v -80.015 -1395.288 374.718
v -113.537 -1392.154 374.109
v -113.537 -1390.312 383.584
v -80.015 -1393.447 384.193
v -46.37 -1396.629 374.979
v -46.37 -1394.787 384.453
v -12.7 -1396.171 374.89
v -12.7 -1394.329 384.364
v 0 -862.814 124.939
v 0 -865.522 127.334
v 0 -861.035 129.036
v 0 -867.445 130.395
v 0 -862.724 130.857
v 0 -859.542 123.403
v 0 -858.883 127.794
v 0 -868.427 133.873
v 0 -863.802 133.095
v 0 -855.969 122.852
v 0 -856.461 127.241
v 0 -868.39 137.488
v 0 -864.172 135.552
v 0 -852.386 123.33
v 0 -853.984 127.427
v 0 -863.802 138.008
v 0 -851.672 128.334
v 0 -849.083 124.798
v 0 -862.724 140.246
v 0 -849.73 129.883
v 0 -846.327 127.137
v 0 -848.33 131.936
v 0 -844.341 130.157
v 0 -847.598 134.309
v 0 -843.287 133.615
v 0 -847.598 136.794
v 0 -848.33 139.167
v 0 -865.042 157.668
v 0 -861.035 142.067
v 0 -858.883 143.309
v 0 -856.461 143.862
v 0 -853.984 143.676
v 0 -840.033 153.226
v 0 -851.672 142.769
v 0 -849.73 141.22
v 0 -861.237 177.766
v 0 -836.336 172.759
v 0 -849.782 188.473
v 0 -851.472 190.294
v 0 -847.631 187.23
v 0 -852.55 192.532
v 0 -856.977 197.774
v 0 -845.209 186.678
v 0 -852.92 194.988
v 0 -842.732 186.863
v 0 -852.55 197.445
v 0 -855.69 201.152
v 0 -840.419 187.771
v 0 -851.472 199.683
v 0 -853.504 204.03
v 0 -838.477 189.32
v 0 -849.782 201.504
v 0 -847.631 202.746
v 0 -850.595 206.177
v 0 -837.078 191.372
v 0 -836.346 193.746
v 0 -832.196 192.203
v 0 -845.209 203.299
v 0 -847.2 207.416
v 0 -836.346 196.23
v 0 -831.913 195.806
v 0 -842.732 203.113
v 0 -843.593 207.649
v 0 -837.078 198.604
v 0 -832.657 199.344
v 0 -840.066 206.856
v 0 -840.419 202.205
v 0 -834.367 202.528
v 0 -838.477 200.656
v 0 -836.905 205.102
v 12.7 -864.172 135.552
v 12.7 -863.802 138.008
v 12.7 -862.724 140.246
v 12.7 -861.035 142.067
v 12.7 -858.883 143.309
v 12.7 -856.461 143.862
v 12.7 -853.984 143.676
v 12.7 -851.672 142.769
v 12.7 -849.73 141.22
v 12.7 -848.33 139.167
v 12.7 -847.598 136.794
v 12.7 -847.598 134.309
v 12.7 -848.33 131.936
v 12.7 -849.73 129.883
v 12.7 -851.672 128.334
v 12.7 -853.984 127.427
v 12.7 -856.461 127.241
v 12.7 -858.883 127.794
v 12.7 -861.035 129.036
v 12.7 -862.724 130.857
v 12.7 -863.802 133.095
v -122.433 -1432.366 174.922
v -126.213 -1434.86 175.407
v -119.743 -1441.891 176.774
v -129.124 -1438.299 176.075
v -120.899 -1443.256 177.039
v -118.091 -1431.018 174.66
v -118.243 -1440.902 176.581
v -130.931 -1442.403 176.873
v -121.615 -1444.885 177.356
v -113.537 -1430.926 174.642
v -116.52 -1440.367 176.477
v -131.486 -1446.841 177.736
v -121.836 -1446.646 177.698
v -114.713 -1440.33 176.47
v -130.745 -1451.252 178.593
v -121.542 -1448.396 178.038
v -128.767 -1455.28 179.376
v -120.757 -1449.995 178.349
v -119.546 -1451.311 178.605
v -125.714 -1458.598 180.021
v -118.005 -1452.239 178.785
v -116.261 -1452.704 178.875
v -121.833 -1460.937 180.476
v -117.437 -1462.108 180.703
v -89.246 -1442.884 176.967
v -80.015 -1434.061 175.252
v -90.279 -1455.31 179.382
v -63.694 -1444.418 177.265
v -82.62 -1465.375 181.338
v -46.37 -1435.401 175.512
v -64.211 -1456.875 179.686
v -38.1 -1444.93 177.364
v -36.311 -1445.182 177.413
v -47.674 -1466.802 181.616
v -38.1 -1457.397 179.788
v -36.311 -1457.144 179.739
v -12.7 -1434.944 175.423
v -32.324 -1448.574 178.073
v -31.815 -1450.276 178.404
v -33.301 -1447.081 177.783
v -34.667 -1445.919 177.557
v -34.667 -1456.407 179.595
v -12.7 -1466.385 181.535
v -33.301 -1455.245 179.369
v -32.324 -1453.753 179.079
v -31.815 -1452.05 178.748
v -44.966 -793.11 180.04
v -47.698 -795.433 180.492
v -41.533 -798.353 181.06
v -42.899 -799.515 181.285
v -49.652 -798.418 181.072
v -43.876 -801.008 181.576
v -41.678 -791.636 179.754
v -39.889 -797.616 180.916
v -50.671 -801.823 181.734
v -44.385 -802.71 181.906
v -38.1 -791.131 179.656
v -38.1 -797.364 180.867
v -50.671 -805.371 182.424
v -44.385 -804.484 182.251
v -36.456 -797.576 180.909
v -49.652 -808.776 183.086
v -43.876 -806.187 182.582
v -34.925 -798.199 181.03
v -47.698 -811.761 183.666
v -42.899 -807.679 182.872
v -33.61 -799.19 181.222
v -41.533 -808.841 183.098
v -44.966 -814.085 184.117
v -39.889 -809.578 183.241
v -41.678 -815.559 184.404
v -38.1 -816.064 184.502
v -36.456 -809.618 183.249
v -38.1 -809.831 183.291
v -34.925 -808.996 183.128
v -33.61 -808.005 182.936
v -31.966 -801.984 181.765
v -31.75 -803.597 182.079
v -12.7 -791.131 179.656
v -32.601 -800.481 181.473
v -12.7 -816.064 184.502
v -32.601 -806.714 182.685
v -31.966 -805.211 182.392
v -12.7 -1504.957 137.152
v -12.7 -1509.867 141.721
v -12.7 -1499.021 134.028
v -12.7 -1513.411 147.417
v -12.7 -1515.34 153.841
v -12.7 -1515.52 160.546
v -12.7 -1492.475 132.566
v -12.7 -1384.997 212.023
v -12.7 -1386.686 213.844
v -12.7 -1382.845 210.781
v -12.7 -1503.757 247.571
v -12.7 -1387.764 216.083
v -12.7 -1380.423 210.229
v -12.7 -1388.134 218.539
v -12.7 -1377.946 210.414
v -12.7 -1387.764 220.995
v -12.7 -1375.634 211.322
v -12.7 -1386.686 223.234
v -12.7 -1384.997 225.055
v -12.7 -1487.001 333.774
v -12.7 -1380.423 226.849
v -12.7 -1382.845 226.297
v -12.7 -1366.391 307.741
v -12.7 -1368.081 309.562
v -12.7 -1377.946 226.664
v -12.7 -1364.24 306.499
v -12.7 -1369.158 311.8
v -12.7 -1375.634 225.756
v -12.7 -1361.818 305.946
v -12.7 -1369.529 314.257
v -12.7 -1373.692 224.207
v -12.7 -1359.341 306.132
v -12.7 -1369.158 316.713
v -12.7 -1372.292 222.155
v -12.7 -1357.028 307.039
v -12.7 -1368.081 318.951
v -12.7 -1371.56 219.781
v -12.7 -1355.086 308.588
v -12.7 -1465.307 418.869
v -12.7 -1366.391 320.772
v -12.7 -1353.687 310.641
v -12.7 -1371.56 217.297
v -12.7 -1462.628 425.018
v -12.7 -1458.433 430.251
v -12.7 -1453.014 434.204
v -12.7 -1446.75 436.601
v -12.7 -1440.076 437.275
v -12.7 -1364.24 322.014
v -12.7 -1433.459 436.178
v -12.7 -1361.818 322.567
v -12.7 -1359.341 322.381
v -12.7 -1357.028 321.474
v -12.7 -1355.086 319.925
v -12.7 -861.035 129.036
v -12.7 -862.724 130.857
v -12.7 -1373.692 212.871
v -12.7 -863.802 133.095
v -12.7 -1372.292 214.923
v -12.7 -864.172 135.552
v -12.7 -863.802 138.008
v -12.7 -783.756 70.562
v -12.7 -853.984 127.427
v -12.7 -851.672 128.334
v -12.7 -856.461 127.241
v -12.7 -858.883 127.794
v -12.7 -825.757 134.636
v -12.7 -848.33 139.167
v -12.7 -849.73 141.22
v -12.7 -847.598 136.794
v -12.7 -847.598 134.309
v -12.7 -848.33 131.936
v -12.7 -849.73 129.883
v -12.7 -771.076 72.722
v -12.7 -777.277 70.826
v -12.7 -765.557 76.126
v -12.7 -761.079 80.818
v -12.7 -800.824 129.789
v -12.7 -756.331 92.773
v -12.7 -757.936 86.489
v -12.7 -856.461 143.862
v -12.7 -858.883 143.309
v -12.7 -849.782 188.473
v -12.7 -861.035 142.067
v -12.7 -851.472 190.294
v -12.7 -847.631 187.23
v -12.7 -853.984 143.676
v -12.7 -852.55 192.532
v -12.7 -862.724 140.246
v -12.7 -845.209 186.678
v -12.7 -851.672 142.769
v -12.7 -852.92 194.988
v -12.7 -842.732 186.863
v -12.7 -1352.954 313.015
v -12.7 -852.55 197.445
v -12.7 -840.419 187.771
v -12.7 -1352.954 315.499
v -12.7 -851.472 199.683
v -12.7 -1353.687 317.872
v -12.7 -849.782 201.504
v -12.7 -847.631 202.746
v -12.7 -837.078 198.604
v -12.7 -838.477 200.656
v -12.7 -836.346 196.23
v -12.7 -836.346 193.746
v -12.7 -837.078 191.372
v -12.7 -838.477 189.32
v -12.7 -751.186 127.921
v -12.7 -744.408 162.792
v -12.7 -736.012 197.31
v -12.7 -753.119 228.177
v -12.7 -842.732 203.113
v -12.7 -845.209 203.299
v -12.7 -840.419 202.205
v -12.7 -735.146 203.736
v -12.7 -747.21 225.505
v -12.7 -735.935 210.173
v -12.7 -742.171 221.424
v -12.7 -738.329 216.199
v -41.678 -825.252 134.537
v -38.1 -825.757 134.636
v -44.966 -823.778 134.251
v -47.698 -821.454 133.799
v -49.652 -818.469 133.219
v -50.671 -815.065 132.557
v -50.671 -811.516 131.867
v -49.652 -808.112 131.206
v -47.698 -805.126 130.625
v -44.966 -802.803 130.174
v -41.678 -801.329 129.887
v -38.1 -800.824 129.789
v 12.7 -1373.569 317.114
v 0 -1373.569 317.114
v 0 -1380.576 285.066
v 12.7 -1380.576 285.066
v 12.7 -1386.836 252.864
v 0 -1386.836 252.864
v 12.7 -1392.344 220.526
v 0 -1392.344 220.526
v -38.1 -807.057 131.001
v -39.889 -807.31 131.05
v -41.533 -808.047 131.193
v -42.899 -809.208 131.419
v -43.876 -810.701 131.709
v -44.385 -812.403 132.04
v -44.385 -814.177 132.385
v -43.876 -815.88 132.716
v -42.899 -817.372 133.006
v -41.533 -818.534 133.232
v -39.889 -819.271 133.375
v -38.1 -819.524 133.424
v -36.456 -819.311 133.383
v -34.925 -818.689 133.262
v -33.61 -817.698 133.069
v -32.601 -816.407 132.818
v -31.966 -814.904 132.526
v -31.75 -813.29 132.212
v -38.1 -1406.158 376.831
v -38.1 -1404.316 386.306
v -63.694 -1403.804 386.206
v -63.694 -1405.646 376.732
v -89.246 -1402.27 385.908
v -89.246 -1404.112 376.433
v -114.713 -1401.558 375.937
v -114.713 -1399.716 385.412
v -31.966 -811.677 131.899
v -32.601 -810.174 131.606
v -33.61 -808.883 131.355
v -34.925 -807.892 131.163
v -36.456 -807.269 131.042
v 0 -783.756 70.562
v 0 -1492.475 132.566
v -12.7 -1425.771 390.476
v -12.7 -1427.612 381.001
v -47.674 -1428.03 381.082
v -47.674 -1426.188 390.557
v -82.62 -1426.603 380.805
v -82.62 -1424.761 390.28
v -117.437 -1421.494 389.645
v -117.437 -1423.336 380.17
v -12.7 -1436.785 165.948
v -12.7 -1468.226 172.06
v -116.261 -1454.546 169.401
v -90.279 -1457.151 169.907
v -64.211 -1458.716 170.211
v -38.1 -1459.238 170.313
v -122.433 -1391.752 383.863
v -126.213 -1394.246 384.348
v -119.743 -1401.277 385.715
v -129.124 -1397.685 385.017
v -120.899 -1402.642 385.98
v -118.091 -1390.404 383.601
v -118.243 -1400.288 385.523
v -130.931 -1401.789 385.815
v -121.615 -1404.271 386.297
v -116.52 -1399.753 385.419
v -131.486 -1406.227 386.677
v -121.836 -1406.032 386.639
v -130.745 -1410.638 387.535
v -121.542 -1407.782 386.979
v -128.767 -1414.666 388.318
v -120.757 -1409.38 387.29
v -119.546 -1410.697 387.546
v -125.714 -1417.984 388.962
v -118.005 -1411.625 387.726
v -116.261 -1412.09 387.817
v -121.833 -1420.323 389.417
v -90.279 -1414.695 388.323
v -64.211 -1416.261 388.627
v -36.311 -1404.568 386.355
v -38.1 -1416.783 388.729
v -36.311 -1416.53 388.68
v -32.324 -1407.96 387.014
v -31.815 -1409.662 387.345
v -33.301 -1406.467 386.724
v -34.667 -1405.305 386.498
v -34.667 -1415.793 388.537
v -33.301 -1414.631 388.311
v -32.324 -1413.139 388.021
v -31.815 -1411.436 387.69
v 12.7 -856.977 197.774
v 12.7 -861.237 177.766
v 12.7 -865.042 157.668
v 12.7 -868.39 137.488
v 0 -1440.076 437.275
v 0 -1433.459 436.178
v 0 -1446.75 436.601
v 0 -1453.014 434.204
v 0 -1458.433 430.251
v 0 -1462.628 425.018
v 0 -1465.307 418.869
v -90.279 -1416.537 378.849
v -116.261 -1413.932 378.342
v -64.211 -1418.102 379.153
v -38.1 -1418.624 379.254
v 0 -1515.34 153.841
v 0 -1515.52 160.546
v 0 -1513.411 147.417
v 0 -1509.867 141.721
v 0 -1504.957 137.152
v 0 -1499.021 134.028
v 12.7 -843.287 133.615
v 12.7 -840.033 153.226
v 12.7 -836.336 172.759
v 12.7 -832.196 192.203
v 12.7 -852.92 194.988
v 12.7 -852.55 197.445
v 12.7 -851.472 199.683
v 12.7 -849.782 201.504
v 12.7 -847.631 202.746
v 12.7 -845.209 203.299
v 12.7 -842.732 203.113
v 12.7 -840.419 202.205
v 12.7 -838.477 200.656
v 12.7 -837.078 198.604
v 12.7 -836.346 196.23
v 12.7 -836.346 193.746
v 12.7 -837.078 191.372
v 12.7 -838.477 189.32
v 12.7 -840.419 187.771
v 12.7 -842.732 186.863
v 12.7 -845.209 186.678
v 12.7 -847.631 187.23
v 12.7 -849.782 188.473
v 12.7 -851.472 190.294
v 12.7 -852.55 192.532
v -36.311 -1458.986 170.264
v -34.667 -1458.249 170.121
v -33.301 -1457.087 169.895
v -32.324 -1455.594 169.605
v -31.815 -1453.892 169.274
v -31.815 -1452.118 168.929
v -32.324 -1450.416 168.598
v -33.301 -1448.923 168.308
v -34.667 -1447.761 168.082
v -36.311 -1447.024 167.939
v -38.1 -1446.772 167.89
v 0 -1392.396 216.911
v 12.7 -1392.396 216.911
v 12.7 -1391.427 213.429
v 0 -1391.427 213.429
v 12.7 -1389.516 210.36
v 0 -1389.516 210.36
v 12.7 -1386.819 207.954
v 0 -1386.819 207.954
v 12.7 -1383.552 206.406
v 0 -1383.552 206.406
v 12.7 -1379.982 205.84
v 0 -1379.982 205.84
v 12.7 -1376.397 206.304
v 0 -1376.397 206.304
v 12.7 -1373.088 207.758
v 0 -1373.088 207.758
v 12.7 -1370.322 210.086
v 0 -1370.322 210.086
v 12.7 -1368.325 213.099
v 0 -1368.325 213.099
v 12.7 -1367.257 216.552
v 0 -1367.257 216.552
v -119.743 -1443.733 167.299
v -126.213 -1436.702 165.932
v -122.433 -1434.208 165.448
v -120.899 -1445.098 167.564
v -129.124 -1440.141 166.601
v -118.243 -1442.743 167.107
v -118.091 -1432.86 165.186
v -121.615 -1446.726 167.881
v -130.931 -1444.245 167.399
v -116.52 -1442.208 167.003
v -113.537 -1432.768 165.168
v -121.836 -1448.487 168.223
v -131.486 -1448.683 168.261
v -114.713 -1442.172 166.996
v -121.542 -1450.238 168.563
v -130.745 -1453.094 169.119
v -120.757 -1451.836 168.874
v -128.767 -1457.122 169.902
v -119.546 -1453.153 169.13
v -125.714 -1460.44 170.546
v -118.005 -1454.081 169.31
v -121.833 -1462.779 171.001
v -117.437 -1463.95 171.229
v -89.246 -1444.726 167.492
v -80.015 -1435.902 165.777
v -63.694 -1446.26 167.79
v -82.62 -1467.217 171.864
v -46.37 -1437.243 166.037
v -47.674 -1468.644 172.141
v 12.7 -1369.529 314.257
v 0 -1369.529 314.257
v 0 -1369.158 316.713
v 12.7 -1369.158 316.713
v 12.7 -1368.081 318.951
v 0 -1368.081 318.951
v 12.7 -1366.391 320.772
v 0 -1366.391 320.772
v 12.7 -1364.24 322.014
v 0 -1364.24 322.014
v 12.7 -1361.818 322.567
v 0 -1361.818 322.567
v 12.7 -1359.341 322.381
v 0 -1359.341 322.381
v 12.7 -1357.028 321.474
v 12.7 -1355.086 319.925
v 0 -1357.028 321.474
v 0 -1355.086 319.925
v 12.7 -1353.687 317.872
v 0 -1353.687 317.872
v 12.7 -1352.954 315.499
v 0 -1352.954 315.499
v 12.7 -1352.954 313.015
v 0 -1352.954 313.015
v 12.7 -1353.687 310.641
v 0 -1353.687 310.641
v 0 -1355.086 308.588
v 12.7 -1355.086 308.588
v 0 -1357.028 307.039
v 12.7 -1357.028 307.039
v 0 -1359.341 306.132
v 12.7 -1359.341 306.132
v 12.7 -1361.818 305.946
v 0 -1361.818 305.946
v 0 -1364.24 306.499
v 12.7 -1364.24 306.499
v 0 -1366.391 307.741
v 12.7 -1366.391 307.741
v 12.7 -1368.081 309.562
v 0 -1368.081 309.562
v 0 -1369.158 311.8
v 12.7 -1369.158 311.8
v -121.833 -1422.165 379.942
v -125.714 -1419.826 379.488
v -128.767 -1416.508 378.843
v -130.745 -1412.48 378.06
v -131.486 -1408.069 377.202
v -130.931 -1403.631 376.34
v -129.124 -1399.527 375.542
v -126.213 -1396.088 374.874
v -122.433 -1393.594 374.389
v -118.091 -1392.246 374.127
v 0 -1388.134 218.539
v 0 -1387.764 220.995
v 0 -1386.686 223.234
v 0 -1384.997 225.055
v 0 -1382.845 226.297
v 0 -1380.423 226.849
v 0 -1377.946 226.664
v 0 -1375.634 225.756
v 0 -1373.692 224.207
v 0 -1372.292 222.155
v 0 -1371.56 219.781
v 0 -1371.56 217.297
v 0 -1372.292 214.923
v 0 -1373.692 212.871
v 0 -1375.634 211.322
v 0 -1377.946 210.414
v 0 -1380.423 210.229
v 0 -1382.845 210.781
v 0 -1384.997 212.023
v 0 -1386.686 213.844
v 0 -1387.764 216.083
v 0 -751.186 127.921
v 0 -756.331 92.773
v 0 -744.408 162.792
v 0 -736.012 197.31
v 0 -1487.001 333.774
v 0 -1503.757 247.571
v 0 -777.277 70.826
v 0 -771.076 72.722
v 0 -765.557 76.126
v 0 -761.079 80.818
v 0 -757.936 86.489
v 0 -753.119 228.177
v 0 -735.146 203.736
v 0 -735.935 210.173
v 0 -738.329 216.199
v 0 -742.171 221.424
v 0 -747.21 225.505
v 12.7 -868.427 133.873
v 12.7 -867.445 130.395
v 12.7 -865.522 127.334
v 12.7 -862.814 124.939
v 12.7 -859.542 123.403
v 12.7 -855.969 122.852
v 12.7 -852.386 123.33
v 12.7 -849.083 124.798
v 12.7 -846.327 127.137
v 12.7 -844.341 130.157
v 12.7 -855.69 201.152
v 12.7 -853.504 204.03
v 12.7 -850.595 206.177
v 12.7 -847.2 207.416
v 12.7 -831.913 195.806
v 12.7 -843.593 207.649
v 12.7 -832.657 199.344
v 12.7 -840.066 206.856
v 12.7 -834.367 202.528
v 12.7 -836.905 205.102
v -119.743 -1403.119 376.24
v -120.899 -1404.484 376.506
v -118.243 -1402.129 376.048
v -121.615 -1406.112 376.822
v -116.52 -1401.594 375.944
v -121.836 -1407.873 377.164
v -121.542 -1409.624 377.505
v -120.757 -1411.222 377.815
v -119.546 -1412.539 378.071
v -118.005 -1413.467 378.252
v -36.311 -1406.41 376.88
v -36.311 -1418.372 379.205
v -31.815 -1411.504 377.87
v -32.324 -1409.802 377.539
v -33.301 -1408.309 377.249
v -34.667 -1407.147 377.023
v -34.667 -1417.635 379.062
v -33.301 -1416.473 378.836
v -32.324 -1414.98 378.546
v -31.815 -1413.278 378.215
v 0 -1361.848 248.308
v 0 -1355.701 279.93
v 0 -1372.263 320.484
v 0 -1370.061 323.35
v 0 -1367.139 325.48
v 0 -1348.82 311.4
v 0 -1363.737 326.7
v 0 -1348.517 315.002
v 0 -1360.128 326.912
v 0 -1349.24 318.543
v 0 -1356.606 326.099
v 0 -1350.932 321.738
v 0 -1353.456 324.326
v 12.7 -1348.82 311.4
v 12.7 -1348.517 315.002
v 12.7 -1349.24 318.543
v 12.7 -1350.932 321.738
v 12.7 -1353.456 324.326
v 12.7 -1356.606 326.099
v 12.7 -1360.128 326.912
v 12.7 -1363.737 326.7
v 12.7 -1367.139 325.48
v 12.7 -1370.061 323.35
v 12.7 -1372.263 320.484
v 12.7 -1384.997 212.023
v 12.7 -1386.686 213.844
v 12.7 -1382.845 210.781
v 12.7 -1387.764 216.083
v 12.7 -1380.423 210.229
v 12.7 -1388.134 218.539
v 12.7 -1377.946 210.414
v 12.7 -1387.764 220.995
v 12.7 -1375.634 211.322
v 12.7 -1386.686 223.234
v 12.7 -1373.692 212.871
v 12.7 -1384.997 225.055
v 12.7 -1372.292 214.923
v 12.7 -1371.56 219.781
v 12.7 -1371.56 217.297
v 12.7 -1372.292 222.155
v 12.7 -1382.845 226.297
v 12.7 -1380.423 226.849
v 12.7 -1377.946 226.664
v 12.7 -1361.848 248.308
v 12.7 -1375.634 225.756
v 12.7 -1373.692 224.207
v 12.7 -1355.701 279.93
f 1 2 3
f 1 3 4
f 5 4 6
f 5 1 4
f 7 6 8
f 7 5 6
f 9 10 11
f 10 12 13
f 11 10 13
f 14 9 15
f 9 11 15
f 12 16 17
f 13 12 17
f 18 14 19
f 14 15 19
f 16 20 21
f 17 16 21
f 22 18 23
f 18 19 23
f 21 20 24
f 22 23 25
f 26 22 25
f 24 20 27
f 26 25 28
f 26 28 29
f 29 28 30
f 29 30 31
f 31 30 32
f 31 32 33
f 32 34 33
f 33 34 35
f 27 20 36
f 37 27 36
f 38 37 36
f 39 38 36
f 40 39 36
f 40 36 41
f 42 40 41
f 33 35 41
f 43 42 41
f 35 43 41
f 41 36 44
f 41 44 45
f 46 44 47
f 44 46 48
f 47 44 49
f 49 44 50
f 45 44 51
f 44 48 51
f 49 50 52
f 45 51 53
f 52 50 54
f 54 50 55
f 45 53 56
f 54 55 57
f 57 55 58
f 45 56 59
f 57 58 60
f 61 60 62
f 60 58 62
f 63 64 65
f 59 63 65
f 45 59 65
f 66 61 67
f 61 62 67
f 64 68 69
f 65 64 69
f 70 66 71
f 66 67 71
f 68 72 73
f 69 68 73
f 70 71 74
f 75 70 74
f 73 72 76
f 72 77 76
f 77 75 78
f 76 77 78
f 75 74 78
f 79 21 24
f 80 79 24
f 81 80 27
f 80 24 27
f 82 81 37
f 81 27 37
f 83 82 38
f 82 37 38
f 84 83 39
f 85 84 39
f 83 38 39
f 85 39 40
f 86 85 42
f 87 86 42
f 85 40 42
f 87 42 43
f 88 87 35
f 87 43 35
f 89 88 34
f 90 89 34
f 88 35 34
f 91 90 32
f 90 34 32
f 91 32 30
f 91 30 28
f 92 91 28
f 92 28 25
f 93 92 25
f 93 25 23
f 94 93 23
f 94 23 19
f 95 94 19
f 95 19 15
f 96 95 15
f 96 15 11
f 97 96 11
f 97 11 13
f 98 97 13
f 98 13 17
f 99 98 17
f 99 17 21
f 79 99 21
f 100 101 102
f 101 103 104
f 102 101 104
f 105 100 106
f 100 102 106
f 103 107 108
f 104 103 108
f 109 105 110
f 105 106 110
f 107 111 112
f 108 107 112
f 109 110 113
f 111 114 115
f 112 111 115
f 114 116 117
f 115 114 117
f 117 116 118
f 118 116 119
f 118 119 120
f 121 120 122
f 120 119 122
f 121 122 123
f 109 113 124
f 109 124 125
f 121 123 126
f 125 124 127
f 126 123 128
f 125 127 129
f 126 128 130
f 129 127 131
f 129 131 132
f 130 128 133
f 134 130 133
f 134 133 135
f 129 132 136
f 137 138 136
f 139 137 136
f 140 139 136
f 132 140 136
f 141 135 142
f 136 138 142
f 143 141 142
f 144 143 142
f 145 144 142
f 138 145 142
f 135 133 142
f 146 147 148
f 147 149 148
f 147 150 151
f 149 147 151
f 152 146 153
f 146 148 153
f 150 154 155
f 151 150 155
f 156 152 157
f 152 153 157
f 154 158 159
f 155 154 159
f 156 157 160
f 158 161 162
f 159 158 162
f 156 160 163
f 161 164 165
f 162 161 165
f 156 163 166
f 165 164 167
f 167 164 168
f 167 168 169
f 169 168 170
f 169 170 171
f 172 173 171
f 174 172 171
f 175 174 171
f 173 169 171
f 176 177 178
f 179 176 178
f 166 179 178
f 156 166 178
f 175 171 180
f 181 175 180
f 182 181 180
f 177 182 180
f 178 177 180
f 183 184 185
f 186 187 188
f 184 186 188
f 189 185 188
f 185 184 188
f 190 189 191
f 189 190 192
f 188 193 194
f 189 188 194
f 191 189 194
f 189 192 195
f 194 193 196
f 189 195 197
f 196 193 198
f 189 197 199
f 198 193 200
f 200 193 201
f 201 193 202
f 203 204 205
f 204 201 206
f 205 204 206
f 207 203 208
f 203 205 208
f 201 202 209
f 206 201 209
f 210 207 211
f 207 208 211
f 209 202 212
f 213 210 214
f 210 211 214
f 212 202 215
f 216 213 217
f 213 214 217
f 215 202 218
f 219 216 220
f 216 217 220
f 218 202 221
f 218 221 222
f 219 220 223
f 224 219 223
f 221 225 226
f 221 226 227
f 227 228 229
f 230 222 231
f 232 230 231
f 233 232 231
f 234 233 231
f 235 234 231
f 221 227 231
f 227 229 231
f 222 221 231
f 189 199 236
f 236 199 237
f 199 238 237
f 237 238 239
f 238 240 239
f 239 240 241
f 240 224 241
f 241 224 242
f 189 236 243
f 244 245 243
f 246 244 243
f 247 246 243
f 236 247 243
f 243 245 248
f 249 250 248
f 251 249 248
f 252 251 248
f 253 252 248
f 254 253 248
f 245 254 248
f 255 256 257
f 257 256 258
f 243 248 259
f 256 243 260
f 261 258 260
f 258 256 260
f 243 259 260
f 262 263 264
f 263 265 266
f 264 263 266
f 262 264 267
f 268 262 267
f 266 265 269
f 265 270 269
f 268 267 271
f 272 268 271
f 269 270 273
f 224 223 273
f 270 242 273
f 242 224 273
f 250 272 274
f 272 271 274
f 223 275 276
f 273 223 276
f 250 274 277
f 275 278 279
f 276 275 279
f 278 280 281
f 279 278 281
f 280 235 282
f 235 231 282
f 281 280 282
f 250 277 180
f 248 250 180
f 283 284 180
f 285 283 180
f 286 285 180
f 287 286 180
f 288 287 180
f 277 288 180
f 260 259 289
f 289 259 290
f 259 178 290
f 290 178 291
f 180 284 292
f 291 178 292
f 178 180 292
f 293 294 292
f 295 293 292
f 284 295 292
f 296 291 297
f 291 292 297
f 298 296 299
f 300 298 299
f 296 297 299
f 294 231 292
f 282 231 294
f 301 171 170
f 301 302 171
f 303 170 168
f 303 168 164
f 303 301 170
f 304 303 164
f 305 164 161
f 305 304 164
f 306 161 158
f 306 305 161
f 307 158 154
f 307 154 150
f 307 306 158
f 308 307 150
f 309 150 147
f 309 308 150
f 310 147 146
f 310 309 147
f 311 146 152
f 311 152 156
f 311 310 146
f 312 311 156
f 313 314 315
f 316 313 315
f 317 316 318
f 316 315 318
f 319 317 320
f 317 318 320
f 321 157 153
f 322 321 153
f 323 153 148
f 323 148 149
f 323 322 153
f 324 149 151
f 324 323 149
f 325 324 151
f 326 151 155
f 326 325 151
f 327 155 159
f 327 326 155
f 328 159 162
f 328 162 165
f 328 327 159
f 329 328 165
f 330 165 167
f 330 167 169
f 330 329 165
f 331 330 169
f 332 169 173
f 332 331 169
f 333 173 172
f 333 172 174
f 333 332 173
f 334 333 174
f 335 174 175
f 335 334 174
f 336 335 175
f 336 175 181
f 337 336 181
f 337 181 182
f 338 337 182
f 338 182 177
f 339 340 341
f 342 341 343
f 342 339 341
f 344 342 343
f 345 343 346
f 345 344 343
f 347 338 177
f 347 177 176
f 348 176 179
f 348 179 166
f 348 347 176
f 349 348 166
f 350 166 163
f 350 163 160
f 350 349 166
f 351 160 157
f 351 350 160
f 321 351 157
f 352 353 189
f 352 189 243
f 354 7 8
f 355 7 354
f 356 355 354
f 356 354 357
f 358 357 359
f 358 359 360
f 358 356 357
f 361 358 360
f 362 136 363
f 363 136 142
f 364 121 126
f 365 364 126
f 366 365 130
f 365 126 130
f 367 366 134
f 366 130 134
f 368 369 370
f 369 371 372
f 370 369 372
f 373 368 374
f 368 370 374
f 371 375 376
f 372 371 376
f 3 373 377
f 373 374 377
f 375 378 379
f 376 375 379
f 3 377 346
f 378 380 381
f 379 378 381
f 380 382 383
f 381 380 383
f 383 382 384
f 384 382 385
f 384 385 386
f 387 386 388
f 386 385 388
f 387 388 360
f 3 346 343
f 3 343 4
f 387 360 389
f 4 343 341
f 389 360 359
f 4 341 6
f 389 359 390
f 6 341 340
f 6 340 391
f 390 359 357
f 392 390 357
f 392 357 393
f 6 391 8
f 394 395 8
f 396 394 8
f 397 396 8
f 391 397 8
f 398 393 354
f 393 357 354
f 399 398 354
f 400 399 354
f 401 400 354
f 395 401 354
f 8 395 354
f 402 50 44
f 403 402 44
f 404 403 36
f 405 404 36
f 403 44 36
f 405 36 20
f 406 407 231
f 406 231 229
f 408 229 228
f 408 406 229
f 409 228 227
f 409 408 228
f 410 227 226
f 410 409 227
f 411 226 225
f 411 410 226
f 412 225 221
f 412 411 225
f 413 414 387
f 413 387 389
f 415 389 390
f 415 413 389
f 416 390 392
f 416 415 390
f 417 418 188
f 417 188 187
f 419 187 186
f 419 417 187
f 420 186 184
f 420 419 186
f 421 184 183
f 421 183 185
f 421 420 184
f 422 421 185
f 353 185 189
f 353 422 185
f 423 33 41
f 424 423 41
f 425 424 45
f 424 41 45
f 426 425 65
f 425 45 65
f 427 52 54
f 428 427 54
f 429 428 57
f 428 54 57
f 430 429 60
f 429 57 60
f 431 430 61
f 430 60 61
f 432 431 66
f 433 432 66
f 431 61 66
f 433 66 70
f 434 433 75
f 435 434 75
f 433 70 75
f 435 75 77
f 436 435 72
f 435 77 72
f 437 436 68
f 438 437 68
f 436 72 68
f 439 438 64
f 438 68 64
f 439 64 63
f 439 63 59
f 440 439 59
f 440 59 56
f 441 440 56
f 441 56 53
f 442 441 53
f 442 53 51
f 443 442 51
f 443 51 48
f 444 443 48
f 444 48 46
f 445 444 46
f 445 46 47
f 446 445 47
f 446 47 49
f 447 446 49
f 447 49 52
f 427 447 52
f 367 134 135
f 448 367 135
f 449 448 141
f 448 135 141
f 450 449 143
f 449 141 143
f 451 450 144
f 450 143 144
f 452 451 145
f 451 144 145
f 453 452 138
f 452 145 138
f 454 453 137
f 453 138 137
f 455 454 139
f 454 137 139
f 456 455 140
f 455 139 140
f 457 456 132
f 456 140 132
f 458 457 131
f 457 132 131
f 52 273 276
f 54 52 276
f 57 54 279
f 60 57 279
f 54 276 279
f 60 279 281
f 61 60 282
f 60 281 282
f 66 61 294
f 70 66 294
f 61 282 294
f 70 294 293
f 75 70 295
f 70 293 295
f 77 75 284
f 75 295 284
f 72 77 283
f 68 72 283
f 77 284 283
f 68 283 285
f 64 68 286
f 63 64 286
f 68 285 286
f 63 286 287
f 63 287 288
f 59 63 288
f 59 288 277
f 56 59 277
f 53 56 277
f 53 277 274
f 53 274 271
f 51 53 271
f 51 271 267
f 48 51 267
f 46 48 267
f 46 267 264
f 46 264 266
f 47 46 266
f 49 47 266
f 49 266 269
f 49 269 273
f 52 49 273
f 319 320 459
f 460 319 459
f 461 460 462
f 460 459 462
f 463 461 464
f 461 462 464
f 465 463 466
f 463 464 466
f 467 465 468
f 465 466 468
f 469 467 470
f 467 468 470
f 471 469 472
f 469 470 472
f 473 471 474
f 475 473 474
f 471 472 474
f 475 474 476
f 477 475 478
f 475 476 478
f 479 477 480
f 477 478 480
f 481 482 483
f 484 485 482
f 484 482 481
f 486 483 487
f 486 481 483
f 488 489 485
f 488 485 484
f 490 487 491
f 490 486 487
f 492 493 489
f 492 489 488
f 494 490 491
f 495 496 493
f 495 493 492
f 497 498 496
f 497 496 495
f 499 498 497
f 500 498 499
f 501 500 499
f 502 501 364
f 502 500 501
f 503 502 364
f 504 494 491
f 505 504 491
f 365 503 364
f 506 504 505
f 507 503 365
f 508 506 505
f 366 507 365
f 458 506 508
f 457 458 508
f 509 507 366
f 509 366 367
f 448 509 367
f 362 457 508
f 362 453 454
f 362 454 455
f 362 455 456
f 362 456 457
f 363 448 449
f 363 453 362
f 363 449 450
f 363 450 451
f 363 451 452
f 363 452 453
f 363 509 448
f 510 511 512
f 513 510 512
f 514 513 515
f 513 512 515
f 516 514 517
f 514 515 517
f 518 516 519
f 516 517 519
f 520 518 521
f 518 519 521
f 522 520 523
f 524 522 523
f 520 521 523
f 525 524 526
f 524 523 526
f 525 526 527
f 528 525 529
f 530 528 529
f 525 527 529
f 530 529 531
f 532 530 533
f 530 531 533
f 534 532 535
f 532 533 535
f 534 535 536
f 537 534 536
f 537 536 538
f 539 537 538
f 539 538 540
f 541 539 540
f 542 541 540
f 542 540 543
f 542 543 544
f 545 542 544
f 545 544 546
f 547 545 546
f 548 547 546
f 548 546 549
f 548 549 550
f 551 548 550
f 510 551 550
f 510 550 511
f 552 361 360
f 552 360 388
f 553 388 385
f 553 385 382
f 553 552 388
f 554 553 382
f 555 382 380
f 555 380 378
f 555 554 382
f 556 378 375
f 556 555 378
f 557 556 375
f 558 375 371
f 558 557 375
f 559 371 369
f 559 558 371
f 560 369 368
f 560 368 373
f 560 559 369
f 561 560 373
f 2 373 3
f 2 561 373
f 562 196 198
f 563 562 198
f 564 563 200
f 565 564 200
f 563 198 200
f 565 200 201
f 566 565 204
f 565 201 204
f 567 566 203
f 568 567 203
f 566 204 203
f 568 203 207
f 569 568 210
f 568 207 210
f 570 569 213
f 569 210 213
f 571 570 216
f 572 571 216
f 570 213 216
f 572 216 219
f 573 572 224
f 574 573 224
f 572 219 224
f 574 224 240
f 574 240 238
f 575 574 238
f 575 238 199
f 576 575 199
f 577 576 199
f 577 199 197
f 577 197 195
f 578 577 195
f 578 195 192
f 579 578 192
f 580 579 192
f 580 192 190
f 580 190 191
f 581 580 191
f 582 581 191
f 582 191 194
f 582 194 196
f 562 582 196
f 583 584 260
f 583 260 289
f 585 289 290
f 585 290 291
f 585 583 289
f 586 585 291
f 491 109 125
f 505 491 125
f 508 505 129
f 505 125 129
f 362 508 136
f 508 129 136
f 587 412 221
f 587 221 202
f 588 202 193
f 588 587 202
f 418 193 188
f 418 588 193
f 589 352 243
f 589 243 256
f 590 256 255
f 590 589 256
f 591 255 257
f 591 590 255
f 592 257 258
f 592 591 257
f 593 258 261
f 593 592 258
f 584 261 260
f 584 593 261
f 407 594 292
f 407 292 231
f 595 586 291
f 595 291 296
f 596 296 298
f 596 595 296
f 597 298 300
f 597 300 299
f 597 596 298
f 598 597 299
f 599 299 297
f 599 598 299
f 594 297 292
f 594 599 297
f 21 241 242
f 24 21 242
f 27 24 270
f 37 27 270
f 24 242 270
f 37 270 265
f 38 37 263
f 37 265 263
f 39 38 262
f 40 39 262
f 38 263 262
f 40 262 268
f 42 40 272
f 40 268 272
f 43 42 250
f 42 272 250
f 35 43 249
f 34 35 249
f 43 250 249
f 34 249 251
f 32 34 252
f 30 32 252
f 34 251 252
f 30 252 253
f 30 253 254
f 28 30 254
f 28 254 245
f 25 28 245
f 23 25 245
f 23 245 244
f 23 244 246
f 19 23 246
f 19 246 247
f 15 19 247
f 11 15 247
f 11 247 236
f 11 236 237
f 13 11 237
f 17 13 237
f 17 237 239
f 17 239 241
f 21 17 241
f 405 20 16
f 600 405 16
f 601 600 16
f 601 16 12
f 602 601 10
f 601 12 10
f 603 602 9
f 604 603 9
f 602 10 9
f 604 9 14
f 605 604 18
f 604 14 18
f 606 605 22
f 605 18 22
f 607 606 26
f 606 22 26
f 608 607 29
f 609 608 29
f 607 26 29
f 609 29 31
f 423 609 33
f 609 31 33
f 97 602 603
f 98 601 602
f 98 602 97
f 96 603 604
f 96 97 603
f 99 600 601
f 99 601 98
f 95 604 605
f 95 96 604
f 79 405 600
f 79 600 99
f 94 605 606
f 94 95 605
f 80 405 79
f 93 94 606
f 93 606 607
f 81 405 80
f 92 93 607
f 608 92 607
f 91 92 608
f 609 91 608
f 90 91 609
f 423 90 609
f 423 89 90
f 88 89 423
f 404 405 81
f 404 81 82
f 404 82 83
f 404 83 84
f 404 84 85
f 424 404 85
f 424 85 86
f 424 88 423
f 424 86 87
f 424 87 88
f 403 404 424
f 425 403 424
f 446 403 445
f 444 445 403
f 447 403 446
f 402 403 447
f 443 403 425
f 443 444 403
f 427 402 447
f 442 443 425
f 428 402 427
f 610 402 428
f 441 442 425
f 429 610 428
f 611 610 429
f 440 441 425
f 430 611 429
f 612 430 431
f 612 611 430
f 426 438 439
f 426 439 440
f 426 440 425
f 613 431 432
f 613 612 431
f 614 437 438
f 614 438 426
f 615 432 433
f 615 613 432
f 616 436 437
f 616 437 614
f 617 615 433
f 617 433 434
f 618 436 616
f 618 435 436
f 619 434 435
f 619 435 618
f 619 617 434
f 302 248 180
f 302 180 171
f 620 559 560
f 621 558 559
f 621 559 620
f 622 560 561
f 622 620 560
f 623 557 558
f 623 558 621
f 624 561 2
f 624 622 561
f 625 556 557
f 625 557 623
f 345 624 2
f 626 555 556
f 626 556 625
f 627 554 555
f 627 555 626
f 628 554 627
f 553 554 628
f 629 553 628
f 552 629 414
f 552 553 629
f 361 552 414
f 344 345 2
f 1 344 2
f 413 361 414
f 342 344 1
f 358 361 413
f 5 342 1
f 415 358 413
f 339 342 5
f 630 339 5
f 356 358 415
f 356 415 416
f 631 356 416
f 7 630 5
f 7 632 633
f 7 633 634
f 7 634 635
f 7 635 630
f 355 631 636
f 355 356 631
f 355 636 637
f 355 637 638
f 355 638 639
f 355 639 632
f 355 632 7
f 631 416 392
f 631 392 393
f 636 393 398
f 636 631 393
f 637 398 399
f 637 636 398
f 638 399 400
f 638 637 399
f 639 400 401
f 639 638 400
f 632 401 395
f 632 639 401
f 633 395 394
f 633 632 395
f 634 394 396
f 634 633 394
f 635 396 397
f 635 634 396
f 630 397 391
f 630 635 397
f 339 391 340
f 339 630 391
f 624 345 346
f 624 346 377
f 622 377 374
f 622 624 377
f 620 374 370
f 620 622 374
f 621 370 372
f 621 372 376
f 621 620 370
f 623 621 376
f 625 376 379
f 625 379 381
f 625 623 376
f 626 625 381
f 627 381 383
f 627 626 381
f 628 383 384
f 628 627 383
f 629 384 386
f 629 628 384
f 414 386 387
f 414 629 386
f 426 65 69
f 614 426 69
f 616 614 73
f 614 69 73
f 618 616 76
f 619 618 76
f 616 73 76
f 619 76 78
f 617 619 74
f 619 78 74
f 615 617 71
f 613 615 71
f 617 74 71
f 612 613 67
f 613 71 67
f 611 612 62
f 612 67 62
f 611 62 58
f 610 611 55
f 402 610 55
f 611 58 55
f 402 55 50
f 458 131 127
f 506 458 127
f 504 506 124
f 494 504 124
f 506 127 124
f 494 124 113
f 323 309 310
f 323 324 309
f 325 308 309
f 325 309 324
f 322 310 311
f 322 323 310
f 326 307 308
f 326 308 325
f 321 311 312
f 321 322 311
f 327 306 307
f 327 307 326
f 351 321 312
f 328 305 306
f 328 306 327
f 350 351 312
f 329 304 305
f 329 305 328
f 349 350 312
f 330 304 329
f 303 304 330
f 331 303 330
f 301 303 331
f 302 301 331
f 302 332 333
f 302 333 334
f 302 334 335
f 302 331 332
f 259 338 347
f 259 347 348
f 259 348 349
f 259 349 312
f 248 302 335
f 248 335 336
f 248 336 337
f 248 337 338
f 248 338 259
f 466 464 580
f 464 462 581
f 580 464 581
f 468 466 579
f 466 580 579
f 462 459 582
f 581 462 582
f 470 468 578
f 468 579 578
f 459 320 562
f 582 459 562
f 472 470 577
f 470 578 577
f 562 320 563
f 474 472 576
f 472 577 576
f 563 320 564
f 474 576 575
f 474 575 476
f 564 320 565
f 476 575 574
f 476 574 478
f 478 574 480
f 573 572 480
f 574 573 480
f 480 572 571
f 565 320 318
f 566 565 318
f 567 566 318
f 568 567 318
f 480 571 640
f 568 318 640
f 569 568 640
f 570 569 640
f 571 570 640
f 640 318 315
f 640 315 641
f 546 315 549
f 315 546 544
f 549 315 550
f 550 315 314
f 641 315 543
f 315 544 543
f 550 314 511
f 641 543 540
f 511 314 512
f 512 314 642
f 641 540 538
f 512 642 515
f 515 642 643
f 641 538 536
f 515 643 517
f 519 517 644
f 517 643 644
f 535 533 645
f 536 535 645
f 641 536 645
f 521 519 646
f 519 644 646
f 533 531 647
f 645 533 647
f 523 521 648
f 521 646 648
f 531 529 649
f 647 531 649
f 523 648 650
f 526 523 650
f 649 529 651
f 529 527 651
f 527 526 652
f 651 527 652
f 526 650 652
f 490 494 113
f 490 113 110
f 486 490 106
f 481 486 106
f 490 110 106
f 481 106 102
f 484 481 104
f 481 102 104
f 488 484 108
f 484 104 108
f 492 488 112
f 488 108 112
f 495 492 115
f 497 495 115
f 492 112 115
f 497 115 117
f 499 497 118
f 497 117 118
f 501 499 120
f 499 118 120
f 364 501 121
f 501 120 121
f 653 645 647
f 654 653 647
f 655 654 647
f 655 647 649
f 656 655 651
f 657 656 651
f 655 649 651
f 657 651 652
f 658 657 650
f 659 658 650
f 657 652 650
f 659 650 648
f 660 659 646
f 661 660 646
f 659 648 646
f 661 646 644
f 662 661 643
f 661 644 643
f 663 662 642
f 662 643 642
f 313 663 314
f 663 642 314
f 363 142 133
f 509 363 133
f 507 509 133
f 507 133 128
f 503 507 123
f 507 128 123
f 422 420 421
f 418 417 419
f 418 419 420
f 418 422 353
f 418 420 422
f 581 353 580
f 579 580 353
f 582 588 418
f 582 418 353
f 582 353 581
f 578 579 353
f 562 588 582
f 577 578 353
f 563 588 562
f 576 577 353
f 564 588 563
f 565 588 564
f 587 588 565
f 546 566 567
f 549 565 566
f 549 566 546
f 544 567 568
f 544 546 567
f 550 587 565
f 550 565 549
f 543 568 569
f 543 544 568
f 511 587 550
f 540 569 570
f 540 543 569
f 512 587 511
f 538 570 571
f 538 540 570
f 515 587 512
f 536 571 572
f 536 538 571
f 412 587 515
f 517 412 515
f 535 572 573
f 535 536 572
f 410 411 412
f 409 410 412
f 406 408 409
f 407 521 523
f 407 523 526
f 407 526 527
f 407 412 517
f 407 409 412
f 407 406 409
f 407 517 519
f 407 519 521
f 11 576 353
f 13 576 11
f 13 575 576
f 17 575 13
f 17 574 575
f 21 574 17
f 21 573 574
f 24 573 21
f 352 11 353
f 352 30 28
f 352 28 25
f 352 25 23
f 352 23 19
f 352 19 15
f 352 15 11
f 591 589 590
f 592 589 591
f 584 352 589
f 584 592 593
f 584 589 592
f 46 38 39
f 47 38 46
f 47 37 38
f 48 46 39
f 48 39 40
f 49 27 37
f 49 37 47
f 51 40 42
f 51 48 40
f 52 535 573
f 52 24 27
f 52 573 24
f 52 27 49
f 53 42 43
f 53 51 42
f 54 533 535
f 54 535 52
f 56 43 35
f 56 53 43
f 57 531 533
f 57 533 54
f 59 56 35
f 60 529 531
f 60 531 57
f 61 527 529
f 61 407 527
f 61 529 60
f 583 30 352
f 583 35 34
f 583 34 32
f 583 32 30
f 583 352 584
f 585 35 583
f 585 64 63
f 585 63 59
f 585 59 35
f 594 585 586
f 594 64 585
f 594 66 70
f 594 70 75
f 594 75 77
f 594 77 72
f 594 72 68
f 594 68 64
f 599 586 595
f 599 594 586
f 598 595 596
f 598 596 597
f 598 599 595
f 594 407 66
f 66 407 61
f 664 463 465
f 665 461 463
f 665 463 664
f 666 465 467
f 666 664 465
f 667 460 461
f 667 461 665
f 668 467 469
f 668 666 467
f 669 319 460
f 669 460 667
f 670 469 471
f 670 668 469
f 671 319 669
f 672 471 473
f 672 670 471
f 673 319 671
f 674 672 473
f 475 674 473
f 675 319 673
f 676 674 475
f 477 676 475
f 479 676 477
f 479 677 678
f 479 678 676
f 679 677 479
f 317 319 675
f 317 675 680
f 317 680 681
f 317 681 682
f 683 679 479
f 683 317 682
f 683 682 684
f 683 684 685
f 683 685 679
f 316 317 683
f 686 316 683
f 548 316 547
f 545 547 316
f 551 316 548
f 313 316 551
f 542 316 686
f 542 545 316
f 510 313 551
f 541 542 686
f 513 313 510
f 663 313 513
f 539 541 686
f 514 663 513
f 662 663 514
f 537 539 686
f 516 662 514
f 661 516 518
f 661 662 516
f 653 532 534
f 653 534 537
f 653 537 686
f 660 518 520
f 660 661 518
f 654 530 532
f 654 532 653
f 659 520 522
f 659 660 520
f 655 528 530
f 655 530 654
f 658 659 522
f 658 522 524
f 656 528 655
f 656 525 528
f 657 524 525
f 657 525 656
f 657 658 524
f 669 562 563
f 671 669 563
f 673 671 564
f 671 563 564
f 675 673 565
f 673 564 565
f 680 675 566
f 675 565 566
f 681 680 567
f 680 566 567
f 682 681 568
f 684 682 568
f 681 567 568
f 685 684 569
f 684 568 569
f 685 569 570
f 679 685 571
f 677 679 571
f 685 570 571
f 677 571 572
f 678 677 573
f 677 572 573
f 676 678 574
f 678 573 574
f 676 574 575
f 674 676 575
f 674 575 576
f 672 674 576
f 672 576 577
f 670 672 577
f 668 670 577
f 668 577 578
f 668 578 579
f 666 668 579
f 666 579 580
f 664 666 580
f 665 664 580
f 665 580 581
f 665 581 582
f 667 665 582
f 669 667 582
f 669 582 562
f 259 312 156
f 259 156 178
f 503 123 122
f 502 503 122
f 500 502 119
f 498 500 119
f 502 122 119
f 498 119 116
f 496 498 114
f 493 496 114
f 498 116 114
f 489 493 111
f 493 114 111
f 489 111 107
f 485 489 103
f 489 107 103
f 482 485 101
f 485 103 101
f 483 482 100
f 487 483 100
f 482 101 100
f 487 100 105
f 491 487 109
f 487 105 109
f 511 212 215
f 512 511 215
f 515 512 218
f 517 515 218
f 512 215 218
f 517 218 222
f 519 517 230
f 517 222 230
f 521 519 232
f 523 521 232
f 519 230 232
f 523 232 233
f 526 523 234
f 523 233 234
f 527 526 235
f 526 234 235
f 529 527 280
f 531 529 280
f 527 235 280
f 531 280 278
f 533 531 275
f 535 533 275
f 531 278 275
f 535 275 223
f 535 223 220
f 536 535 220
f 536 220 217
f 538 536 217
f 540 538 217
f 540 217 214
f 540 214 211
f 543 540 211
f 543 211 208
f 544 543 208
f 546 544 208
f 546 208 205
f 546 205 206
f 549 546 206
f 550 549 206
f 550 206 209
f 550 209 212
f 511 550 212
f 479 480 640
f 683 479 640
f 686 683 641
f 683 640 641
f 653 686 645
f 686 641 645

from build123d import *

# Parameters (mm, degrees)
F1_DEPTH  = 12.7
F2_DEPTH  = 12.7
F4_D      = 16.66748
F7_DEPTH  = 25.4
F10_DEPTH = 9.652
F13_D     = 16.66748
F15_D     = 16.66748


# Not quite as in the source:
# - a feature of the source that left no trace in its solid (it failed there, or was rolled back) is left out
# - a pattern or mirror of a feature is missing from the dataset's text; its kind, count and spacing are read off the source's solid


with BuildPart() as f1:
    # F0 (on Right) → F1 (new body)
    with BuildSketch(Plane.YZ):
        with BuildLine():
            ThreePointArc((-756.3314490517, 92.7725130381), (-747.9999137871, 145.3964544769), (-736.0115033336, 197.3095713861))
            ThreePointArc((-736.0115033336, 197.3095713861), (-738.3291312366, 216.1993713631), (-753.1189788115, 228.1766979004))
            Line((-753.1189788115, 228.1766979004), (-1433.4591504296, 436.1775621929))
            ThreePointArc((-1433.4591504296, 436.1775621929), (-1453.0143855451, 434.2043994356), (-1465.30717803, 418.8685641269))
            ThreePointArc((-1465.30717803, 418.8685641269), (-1495.9998275742, 290.7929089539), (-1515.5200833468, 160.5455604257))
            ThreePointArc((-1515.5200833468, 160.5455604257), (-1509.8673096495, 141.7214604148), (-1492.4751711568, 132.5664557537))
            Line((-1492.4751711568, 132.5664557537), (-783.7562532192, 70.5615848078))
            ThreePointArc((-783.7562532192, 70.5615848078), (-765.5565598439, 76.1263941769), (-756.3314490517, 92.7725130381))
        make_face()
        with BuildLine():
            ThreePointArc((-868.3901696878, 137.4879790683), (-863.196533516, 167.7279226013), (-856.9770599652, 197.7736575783))
            ThreePointArc((-856.9770599652, 197.7736575783), (-841.8007632153, 207.3788653824), (-832.1955554113, 192.2025686325))
            ThreePointArc((-832.1955554113, 192.2025686325), (-838.239832524, 163.0031923871), (-843.2871690853, 133.6150782495))
            ThreePointArc((-843.2871690853, 133.6150782495), (-857.775119796, 123.0000283577), (-868.3901696878, 137.4879790683))
        make_face(mode=Mode.SUBTRACT)
        with BuildLine():
            ThreePointArc((-1392.344253737, 220.5256653672), (-1383.7998405062, 268.9834407823), (-1373.5694803277, 317.1135013085))
            ThreePointArc((-1373.5694803277, 317.1135013085), (-1358.3381021148, 326.6311227412), (-1348.8204806822, 311.3997445282))
            ThreePointArc((-1348.8204806822, 311.3997445282), (-1358.8665100466, 264.1368922998), (-1367.2569698858, 216.5522299552))
            ThreePointArc((-1367.2569698858, 216.5522299552), (-1381.7873295174, 205.9953057356), (-1392.344253737, 220.5256653672))
        make_face(mode=Mode.SUBTRACT)
        with BuildLine():
            ThreePointArc((-1348.8204806822, 311.3997445282), (-1358.3381021148, 326.6311227412), (-1373.5694803277, 317.1135013085))
            ThreePointArc((-1373.5694803277, 317.1135013085), (-1383.7998405062, 268.9834407823), (-1392.344253737, 220.5256653672))
            ThreePointArc((-1392.344253737, 220.5256653672), (-1381.7873295174, 205.9953057356), (-1367.2569698858, 216.5522299552))
            ThreePointArc((-1367.2569698858, 216.5522299552), (-1358.8665100466, 264.1368922998), (-1348.8204806822, 311.3997445282))
        make_face()
        with BuildLine():
            ThreePointArc((-832.1955554113, 192.2025686325), (-841.8007632153, 207.3788653824), (-856.9770599652, 197.7736575783))
            ThreePointArc((-856.9770599652, 197.7736575783), (-863.196533516, 167.7279226013), (-868.3901696878, 137.4879790683))
            ThreePointArc((-868.3901696878, 137.4879790683), (-857.775119796, 123.0000283577), (-843.2871690853, 133.6150782495))
            ThreePointArc((-843.2871690853, 133.6150782495), (-838.239832524, 163.0031923871), (-832.1955554113, 192.2025686325))
        make_face()
    extrude(amount=-F1_DEPTH)

    # F4 (through all)
    with Locations(Plane.YZ.offset(12.7)):
        with Locations((-1361.194980505, 314.2566229184), (-1379.8006118114, 218.5389476612), (-844.5863076883, 194.9881131054), (-855.8386693866, 135.5515286589)):
            Hole(F4_D / 2)

    # F6 (on face) → F7 (join, symmetric)
    with BuildSketch(Plane(origin=(0, 0, 0), x_dir=(1, 0, 0), z_dir=(0, -0.1908089954, -0.9816271834))):
        with BuildLine():
            ThreePointArc((-38.1, 829.9252514334), (-33.6098719395, 828.0653794939), (-31.75, 823.5752514334))
            ThreePointArc((-31.75, 823.5752514334), (-33.6098719395, 819.0851233729), (-38.1, 817.2252514334))
            Line((-38.1, 817.2252514334), (-38.1, 810.8752514334))
            ThreePointArc((-38.1, 810.8752514334), (-29.1197438789, 814.5949953123), (-25.4, 823.5752514334))
            ThreePointArc((-25.4, 823.5752514334), (-29.1197438789, 832.5555075545), (-38.1, 836.2752514334))
            Line((-38.1, 836.2752514334), (-38.1, 829.9252514334))
        make_face()
        with BuildLine():
            ThreePointArc((-38.1, 817.2252514334), (-44.45, 823.5752514334), (-38.1, 829.9252514334))
            Line((-38.1, 829.9252514334), (-38.1, 836.2752514334))
            ThreePointArc((-38.1, 836.2752514334), (-50.8, 823.5752514334), (-38.1, 810.8752514334))
            Line((-38.1, 810.8752514334), (-38.1, 817.2252514334))
        make_face()
        with BuildLine():
            Line((-12.7, 836.2752514334), (-38.1, 836.2752514334))
            ThreePointArc((-38.1, 836.2752514334), (-29.1197438789, 832.5555075545), (-25.4, 823.5752514334))
            ThreePointArc((-25.4, 823.5752514334), (-29.1197438789, 814.5949953123), (-38.1, 810.8752514334))
            Line((-38.1, 810.8752514334), (-12.7, 810.8752514334))
            Line((-12.7, 810.8752514334), (-12.7, 836.2752514334))
        make_face()
    extrude(amount=F7_DEPTH, both=True)


with BuildPart() as f2:
    # F0 (on Right) → F2 (new body)
    with BuildSketch(Plane.YZ):
        with BuildLine():
            ThreePointArc((-1348.8204806822, 311.3997445282), (-1358.3381021148, 326.6311227412), (-1373.5694803277, 317.1135013085))
            ThreePointArc((-1373.5694803277, 317.1135013085), (-1383.7998405062, 268.9834407823), (-1392.344253737, 220.5256653672))
            ThreePointArc((-1392.344253737, 220.5256653672), (-1381.7873295174, 205.9953057356), (-1367.2569698858, 216.5522299552))
            ThreePointArc((-1367.2569698858, 216.5522299552), (-1358.8665100466, 264.1368922998), (-1348.8204806822, 311.3997445282))
        make_face()
    extrude(amount=F2_DEPTH)

    # F15 (through all)
    with Locations(Plane.YZ.offset(12.7)):
        with Locations((-1361.194980505, 314.2566229184), (-1379.8006118114, 218.5389476612)):
            Hole(F15_D / 2)


with BuildPart() as f2b:
    # F0 (on Right) → F2, piece 2 (new body)
    with BuildSketch(Plane.YZ):
        with BuildLine():
            ThreePointArc((-832.1955554113, 192.2025686325), (-841.8007632153, 207.3788653824), (-856.9770599652, 197.7736575783))
            ThreePointArc((-856.9770599652, 197.7736575783), (-863.196533516, 167.7279226013), (-868.3901696878, 137.4879790683))
            ThreePointArc((-868.3901696878, 137.4879790683), (-857.775119796, 123.0000283577), (-843.2871690853, 133.6150782495))
            ThreePointArc((-843.2871690853, 133.6150782495), (-838.239832524, 163.0031923871), (-832.1955554113, 192.2025686325))
        make_face()
    extrude(amount=F2_DEPTH)

    # F13 (through all)
    with Locations(Plane.YZ.offset(12.7)):
        with Locations((-844.5863076883, 194.9881131054), (-855.8386693866, 135.5515286589)):
            Hole(F13_D / 2)


with BuildPart() as f10:
    # F9 (on face) → F10 (new body)
    with BuildSketch(Plane(origin=(0, -19.3861939303, -99.7333218383), x_dir=(1, 0, 0), z_dir=(0, -0.1908089954, -0.9816271834))):
        with BuildLine():
            Line((-12.7, 1458.0670480707), (-12.7, 1474.0815496381))
            ThreePointArc((-12.7, 1474.0815496381), (-65.1564294406, 1474.0147594815), (-117.4371862954, 1469.7247812442))
            ThreePointArc((-117.4371862954, 1469.7247812442), (-131.3697565808, 1451.8919044925), (-113.5368798291, 1437.9593342071))
            ThreePointArc((-113.5368798291, 1437.9593342071), (-63.2019841466, 1442.064066527), (-12.7, 1442.0518993386))
            Line((-12.7, 1442.0518993386), (-12.7, 1458.0670480707))
        make_face()
        with BuildLine():
            ThreePointArc((-38.1, 1464.9252514334), (-31.75, 1458.5752514334), (-38.1, 1452.2252514334))
            ThreePointArc((-38.1, 1452.2252514334), (-76.4781643786, 1451.0526924613), (-114.7131627316, 1447.5393896627))
            ThreePointArc((-114.7131627316, 1447.5393896627), (-121.7897011252, 1453.068187395), (-116.2609033929, 1460.1447257886))
            ThreePointArc((-116.2609033929, 1460.1447257886), (-77.2534808307, 1463.7290044013), (-38.1, 1464.9252514334))
        make_face(mode=Mode.SUBTRACT)
    extrude(amount=F10_DEPTH)


with BuildPart() as f10_copies_1:
    # F10_copies: instance of F10
    add(f10.part.mirror(Plane(origin=(0, 0, 0), x_dir=(0, 0.9816271834, -0.1908089954), z_dir=(0, 0.1908089954, 0.9816271834))))


solid = Compound([f1.part, f2.part, f2b.part, f10.part, f10_copies_1.part])
